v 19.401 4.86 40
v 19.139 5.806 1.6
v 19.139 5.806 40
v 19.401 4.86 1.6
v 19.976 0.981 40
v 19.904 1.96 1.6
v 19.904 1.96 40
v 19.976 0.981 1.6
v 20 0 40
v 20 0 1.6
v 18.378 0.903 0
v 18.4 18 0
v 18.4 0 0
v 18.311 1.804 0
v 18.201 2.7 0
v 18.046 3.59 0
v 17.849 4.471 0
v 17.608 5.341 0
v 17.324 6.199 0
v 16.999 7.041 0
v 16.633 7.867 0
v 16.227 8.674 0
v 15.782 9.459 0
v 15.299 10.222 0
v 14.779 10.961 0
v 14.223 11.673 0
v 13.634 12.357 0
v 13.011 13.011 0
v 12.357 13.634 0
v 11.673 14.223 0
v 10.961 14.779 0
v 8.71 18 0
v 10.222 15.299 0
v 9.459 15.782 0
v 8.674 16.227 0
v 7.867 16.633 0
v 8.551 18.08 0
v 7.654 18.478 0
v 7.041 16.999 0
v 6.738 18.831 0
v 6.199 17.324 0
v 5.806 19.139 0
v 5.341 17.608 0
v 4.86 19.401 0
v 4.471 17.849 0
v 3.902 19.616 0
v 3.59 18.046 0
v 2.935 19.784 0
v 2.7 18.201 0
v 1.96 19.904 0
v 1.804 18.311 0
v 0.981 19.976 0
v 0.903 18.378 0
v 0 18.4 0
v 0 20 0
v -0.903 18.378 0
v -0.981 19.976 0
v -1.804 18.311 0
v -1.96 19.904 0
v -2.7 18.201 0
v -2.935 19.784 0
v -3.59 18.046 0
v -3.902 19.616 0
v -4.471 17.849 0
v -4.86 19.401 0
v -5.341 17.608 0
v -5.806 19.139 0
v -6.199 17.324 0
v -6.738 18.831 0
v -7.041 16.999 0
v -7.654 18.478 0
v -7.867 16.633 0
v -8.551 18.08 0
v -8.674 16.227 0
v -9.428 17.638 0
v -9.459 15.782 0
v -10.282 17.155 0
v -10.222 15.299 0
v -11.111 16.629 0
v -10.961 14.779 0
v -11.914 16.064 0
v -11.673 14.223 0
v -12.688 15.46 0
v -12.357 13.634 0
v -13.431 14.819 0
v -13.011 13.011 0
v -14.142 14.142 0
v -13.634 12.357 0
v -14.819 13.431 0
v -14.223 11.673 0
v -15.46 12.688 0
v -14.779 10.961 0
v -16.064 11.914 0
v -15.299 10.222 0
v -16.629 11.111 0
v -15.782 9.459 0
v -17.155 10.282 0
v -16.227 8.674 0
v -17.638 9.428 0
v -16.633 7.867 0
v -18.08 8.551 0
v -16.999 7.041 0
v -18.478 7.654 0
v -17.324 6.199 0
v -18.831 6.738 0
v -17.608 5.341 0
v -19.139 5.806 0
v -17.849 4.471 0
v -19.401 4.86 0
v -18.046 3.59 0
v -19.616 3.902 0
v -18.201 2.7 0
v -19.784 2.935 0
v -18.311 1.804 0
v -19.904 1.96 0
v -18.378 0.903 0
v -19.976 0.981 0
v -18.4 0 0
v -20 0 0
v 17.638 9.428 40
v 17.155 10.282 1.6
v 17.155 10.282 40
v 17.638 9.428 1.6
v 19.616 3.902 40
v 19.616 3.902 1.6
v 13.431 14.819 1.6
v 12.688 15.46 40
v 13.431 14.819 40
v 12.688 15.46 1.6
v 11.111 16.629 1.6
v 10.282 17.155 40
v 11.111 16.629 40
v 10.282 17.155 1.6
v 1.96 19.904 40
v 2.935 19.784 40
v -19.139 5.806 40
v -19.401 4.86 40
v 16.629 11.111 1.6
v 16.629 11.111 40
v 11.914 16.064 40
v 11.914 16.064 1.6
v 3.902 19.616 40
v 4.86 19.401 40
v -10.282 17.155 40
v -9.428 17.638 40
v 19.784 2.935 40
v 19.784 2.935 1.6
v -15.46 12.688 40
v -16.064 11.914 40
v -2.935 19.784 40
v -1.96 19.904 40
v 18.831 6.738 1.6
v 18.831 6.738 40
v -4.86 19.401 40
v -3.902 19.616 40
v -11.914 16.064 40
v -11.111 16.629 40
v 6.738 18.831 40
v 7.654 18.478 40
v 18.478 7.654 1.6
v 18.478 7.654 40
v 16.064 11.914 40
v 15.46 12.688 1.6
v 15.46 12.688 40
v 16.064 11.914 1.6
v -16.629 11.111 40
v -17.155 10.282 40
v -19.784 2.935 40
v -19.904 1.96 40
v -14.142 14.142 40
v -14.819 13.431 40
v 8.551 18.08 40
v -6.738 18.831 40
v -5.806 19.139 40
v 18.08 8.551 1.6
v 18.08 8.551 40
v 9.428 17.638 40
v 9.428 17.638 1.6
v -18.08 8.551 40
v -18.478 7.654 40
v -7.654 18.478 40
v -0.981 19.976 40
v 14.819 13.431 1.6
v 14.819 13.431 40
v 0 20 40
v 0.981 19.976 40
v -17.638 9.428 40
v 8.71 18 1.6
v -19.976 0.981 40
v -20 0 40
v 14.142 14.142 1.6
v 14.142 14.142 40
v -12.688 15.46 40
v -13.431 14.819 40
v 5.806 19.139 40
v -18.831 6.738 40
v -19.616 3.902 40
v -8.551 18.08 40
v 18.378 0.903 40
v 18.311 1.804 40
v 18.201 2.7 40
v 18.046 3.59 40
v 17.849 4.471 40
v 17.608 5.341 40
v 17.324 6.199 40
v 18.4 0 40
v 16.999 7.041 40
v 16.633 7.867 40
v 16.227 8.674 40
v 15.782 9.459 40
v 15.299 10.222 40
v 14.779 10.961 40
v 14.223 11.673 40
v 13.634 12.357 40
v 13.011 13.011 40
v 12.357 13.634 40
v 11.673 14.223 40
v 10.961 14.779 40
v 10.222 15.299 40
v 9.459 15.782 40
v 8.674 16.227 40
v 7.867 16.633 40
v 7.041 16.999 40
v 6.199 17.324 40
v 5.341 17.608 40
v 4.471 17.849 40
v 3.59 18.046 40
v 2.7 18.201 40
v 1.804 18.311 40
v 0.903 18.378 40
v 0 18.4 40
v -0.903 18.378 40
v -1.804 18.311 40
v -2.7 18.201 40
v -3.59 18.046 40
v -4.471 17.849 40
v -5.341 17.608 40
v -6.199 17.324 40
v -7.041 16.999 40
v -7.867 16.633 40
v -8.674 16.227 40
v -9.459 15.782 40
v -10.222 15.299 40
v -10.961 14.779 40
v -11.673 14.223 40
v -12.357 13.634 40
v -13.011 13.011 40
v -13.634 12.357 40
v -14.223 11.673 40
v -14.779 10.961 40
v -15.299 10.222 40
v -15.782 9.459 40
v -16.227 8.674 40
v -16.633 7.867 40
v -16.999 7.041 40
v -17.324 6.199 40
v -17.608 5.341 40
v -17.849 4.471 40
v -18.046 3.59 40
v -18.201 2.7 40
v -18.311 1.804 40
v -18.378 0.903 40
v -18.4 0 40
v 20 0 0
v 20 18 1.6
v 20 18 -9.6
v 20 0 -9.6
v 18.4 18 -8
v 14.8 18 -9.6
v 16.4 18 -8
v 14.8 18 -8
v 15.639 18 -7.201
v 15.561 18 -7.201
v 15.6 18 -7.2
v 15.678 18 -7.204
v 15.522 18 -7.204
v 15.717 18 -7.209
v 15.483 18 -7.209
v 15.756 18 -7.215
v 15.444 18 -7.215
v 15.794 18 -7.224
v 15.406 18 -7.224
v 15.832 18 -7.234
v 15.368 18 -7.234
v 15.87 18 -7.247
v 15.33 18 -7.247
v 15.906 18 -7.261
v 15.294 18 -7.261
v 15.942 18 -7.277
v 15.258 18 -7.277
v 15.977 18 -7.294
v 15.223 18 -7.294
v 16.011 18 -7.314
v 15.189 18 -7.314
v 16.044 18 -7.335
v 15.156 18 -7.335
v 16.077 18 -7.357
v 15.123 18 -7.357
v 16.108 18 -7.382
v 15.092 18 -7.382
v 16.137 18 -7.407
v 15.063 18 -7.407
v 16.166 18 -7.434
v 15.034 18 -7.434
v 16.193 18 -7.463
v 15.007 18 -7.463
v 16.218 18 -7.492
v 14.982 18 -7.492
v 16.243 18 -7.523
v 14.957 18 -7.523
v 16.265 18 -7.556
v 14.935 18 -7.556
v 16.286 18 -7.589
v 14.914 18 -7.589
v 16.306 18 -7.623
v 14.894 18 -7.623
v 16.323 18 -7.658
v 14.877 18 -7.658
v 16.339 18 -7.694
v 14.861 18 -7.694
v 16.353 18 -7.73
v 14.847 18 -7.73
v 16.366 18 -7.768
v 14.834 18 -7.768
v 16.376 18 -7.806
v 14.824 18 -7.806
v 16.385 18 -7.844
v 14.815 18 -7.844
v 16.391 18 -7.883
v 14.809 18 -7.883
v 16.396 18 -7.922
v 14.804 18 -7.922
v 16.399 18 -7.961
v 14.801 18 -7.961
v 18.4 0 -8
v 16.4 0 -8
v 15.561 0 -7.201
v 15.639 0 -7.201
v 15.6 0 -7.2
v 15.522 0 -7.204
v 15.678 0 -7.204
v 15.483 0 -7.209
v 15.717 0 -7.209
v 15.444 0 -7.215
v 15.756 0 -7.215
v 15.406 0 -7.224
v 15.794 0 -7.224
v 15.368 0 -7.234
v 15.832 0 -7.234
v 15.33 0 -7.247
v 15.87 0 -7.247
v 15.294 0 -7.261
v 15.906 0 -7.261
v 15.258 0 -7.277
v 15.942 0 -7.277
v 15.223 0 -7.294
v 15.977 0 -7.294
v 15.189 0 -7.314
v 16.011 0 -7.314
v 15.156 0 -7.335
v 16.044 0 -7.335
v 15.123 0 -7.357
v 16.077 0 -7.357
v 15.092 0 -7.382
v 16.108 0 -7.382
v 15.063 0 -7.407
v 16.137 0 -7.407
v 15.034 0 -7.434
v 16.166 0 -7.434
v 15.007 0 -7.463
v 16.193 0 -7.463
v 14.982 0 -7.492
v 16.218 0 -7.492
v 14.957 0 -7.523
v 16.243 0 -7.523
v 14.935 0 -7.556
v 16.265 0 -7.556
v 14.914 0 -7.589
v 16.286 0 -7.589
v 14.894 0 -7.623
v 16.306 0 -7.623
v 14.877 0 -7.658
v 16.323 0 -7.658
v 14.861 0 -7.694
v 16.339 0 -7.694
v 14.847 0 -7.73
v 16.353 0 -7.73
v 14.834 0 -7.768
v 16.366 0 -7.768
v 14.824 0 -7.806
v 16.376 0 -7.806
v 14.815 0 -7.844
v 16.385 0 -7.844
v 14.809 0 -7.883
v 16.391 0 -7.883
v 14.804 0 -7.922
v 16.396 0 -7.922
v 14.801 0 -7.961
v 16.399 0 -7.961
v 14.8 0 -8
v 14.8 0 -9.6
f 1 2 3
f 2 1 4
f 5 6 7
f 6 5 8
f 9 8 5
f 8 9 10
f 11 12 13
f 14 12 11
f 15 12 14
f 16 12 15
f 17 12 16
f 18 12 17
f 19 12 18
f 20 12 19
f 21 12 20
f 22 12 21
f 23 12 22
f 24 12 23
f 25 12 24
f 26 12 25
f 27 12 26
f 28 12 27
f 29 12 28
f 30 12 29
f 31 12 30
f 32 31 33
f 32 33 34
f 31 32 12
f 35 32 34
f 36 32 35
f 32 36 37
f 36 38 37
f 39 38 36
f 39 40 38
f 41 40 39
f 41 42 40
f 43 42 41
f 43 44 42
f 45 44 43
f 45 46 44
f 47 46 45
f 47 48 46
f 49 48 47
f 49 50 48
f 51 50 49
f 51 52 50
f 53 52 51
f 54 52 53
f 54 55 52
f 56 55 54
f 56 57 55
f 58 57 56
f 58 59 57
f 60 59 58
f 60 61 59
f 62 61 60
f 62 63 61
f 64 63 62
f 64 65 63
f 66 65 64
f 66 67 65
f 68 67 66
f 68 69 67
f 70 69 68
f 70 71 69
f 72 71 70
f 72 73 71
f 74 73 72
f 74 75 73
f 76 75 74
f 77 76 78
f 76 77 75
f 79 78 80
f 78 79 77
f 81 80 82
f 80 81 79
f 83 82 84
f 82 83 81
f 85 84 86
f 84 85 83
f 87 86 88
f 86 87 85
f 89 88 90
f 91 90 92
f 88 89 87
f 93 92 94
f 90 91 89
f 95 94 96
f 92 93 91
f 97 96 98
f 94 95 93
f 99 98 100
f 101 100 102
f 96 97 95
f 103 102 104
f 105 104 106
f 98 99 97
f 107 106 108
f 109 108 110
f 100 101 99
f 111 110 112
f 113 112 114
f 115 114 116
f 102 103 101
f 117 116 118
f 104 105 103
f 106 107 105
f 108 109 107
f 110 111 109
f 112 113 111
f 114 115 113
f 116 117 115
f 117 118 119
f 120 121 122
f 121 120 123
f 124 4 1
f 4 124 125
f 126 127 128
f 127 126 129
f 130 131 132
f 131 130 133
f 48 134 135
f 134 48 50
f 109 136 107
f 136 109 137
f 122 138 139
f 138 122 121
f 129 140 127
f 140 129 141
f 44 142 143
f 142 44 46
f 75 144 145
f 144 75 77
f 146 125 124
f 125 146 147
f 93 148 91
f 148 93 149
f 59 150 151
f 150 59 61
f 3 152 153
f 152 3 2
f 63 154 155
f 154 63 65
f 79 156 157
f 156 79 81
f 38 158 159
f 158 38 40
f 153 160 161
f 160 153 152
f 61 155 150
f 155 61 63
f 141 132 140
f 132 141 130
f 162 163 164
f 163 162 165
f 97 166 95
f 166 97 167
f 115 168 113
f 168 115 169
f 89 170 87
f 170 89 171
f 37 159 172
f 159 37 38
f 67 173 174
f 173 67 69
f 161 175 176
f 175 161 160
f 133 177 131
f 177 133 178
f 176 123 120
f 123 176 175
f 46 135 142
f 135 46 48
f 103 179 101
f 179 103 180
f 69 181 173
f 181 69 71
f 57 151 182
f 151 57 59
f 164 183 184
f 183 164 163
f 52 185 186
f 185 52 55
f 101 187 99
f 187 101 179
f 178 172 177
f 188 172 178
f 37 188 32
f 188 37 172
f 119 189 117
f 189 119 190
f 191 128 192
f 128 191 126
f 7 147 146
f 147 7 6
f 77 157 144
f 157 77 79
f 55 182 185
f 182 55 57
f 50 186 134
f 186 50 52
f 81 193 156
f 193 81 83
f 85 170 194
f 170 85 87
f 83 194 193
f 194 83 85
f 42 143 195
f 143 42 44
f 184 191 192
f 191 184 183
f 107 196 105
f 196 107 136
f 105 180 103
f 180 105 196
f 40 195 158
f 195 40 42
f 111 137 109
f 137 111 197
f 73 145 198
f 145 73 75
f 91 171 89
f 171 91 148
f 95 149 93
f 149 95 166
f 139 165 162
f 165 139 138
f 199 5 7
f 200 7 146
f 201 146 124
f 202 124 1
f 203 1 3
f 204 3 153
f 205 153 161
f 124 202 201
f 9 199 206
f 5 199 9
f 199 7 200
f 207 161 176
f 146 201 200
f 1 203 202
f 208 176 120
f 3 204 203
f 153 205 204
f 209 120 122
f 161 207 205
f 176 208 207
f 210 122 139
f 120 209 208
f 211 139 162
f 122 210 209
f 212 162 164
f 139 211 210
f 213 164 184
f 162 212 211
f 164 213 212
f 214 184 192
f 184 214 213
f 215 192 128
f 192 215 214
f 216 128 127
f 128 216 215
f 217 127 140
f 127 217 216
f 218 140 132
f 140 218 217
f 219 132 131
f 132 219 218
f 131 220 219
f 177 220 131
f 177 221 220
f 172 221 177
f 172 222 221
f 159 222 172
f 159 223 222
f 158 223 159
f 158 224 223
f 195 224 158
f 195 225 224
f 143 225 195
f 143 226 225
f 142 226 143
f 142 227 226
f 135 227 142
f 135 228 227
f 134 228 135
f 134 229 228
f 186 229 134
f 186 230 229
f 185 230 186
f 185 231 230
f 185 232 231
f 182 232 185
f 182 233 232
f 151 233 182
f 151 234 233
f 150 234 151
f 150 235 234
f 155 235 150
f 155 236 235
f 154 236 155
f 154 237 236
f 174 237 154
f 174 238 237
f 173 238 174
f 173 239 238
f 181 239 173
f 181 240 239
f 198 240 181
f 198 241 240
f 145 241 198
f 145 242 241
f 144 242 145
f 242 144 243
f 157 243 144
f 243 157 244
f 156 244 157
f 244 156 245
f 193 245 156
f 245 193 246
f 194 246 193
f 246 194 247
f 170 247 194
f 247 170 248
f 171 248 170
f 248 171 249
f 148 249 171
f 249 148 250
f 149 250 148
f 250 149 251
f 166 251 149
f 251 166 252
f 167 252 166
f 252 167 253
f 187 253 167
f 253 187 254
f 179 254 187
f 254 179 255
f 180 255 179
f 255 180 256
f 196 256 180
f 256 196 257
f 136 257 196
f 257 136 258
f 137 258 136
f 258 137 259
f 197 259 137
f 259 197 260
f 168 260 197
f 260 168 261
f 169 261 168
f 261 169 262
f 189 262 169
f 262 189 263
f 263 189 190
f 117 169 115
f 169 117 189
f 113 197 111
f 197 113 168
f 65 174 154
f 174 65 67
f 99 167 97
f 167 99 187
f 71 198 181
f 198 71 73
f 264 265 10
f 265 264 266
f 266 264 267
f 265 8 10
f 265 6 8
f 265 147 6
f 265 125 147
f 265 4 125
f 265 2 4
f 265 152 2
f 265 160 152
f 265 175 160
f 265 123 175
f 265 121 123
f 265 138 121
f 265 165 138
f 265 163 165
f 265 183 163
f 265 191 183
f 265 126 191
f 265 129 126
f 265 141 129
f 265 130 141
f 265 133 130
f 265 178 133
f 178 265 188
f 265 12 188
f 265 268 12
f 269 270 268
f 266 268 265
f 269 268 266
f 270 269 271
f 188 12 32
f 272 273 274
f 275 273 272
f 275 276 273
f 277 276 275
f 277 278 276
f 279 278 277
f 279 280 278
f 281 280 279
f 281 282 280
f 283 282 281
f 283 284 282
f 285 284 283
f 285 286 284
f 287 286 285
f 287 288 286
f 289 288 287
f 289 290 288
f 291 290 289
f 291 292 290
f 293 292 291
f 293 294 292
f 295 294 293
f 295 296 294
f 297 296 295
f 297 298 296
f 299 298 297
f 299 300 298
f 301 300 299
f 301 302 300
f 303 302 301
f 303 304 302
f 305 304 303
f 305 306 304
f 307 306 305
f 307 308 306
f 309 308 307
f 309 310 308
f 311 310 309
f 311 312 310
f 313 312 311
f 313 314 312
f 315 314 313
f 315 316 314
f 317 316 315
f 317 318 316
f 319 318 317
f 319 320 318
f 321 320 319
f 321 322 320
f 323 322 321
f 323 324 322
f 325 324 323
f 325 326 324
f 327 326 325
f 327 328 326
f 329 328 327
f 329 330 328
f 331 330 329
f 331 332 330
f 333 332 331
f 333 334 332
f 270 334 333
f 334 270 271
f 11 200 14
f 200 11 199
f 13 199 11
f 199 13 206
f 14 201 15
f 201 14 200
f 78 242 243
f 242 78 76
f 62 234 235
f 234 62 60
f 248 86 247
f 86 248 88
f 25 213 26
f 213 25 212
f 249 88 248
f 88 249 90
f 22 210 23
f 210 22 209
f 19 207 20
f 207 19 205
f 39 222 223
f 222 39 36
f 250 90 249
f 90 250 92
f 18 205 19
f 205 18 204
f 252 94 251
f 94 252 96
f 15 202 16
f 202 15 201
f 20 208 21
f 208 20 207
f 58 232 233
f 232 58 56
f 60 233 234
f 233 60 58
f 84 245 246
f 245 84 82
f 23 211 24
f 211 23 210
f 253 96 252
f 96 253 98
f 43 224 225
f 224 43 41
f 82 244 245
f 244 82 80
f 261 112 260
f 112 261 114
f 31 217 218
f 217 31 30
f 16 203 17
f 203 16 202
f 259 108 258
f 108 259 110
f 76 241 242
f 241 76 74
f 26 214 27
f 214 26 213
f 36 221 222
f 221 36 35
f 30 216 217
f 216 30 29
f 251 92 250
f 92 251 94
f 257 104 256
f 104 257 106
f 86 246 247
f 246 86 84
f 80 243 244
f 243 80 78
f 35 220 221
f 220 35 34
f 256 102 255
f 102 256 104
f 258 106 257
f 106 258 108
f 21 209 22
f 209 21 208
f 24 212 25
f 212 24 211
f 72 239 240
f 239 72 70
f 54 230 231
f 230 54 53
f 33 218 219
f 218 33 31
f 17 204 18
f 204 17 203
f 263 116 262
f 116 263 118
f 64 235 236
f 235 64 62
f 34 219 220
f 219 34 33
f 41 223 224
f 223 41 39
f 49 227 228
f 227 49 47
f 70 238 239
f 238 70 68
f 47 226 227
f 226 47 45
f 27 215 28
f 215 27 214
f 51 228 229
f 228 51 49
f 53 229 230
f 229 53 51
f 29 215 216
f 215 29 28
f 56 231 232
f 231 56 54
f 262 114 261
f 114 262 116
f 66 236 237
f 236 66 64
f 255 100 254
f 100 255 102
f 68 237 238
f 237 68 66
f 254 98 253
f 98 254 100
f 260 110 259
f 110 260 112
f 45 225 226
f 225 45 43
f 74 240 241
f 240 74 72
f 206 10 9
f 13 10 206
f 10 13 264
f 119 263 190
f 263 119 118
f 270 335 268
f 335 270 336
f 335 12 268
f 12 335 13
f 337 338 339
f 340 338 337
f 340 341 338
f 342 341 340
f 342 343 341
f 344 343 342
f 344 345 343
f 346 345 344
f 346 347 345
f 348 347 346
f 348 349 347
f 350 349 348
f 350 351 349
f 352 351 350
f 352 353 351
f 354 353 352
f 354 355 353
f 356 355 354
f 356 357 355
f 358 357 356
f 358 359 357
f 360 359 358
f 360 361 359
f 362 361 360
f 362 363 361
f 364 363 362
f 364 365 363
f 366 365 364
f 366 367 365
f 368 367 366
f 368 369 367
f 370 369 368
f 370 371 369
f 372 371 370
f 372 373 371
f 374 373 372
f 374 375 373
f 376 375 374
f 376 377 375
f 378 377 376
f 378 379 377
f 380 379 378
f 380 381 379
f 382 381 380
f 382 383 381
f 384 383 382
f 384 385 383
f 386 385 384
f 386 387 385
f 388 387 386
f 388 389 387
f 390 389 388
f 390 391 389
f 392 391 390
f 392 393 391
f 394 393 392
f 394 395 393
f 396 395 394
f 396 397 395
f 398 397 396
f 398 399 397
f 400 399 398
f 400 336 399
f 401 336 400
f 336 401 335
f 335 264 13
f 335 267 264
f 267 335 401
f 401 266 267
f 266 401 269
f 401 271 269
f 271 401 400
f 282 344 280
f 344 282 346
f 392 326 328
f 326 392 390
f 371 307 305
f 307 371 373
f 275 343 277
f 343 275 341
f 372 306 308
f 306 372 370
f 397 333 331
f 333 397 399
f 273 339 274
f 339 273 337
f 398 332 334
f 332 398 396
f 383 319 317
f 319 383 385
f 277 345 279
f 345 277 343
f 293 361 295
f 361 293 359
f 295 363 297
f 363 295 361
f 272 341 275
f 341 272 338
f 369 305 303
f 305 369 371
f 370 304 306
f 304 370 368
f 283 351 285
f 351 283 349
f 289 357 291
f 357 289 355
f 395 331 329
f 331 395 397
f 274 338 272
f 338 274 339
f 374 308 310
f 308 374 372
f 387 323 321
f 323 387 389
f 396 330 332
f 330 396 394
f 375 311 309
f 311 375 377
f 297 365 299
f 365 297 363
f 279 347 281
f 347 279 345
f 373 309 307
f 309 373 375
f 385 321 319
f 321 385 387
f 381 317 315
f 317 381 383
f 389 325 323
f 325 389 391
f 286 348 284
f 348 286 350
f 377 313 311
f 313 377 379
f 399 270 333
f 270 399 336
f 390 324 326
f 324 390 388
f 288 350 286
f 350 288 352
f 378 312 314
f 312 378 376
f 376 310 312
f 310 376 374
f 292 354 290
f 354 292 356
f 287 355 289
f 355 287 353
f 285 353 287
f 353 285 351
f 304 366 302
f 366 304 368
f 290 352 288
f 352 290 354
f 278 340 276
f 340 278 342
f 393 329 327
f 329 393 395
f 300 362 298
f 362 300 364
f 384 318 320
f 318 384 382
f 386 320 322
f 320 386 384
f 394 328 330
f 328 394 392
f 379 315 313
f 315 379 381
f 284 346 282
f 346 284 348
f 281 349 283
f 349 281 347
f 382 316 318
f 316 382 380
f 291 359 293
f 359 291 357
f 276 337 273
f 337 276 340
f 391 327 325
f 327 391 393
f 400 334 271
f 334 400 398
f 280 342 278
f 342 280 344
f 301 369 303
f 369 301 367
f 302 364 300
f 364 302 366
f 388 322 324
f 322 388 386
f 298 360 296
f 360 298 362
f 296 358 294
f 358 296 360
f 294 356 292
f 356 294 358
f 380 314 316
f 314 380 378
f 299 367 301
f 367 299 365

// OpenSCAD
t=1.6;
cr=20;
ch=40;
cw=18;

$fn=128;

translate([20-t,0,-8]) cube([t,cw,8]);
bh=t*2+2;
translate([20-bh,0,-8-t]) cube([bh,cw,t]);
translate([20-bh+t/2,0,-8]) rotate([-90,0,0]) cylinder(r=t/2, h=cw);

difference() {
  union() {
    cylinder(r=cr,h=ch);
    cube([20,cw,t]);
  }
  translate([0,0,-0.1]) cylinder(r=cr-t,h=ch + 0.2);
  translate([-250,-500,-1]) cube([500,500,50]);
}
